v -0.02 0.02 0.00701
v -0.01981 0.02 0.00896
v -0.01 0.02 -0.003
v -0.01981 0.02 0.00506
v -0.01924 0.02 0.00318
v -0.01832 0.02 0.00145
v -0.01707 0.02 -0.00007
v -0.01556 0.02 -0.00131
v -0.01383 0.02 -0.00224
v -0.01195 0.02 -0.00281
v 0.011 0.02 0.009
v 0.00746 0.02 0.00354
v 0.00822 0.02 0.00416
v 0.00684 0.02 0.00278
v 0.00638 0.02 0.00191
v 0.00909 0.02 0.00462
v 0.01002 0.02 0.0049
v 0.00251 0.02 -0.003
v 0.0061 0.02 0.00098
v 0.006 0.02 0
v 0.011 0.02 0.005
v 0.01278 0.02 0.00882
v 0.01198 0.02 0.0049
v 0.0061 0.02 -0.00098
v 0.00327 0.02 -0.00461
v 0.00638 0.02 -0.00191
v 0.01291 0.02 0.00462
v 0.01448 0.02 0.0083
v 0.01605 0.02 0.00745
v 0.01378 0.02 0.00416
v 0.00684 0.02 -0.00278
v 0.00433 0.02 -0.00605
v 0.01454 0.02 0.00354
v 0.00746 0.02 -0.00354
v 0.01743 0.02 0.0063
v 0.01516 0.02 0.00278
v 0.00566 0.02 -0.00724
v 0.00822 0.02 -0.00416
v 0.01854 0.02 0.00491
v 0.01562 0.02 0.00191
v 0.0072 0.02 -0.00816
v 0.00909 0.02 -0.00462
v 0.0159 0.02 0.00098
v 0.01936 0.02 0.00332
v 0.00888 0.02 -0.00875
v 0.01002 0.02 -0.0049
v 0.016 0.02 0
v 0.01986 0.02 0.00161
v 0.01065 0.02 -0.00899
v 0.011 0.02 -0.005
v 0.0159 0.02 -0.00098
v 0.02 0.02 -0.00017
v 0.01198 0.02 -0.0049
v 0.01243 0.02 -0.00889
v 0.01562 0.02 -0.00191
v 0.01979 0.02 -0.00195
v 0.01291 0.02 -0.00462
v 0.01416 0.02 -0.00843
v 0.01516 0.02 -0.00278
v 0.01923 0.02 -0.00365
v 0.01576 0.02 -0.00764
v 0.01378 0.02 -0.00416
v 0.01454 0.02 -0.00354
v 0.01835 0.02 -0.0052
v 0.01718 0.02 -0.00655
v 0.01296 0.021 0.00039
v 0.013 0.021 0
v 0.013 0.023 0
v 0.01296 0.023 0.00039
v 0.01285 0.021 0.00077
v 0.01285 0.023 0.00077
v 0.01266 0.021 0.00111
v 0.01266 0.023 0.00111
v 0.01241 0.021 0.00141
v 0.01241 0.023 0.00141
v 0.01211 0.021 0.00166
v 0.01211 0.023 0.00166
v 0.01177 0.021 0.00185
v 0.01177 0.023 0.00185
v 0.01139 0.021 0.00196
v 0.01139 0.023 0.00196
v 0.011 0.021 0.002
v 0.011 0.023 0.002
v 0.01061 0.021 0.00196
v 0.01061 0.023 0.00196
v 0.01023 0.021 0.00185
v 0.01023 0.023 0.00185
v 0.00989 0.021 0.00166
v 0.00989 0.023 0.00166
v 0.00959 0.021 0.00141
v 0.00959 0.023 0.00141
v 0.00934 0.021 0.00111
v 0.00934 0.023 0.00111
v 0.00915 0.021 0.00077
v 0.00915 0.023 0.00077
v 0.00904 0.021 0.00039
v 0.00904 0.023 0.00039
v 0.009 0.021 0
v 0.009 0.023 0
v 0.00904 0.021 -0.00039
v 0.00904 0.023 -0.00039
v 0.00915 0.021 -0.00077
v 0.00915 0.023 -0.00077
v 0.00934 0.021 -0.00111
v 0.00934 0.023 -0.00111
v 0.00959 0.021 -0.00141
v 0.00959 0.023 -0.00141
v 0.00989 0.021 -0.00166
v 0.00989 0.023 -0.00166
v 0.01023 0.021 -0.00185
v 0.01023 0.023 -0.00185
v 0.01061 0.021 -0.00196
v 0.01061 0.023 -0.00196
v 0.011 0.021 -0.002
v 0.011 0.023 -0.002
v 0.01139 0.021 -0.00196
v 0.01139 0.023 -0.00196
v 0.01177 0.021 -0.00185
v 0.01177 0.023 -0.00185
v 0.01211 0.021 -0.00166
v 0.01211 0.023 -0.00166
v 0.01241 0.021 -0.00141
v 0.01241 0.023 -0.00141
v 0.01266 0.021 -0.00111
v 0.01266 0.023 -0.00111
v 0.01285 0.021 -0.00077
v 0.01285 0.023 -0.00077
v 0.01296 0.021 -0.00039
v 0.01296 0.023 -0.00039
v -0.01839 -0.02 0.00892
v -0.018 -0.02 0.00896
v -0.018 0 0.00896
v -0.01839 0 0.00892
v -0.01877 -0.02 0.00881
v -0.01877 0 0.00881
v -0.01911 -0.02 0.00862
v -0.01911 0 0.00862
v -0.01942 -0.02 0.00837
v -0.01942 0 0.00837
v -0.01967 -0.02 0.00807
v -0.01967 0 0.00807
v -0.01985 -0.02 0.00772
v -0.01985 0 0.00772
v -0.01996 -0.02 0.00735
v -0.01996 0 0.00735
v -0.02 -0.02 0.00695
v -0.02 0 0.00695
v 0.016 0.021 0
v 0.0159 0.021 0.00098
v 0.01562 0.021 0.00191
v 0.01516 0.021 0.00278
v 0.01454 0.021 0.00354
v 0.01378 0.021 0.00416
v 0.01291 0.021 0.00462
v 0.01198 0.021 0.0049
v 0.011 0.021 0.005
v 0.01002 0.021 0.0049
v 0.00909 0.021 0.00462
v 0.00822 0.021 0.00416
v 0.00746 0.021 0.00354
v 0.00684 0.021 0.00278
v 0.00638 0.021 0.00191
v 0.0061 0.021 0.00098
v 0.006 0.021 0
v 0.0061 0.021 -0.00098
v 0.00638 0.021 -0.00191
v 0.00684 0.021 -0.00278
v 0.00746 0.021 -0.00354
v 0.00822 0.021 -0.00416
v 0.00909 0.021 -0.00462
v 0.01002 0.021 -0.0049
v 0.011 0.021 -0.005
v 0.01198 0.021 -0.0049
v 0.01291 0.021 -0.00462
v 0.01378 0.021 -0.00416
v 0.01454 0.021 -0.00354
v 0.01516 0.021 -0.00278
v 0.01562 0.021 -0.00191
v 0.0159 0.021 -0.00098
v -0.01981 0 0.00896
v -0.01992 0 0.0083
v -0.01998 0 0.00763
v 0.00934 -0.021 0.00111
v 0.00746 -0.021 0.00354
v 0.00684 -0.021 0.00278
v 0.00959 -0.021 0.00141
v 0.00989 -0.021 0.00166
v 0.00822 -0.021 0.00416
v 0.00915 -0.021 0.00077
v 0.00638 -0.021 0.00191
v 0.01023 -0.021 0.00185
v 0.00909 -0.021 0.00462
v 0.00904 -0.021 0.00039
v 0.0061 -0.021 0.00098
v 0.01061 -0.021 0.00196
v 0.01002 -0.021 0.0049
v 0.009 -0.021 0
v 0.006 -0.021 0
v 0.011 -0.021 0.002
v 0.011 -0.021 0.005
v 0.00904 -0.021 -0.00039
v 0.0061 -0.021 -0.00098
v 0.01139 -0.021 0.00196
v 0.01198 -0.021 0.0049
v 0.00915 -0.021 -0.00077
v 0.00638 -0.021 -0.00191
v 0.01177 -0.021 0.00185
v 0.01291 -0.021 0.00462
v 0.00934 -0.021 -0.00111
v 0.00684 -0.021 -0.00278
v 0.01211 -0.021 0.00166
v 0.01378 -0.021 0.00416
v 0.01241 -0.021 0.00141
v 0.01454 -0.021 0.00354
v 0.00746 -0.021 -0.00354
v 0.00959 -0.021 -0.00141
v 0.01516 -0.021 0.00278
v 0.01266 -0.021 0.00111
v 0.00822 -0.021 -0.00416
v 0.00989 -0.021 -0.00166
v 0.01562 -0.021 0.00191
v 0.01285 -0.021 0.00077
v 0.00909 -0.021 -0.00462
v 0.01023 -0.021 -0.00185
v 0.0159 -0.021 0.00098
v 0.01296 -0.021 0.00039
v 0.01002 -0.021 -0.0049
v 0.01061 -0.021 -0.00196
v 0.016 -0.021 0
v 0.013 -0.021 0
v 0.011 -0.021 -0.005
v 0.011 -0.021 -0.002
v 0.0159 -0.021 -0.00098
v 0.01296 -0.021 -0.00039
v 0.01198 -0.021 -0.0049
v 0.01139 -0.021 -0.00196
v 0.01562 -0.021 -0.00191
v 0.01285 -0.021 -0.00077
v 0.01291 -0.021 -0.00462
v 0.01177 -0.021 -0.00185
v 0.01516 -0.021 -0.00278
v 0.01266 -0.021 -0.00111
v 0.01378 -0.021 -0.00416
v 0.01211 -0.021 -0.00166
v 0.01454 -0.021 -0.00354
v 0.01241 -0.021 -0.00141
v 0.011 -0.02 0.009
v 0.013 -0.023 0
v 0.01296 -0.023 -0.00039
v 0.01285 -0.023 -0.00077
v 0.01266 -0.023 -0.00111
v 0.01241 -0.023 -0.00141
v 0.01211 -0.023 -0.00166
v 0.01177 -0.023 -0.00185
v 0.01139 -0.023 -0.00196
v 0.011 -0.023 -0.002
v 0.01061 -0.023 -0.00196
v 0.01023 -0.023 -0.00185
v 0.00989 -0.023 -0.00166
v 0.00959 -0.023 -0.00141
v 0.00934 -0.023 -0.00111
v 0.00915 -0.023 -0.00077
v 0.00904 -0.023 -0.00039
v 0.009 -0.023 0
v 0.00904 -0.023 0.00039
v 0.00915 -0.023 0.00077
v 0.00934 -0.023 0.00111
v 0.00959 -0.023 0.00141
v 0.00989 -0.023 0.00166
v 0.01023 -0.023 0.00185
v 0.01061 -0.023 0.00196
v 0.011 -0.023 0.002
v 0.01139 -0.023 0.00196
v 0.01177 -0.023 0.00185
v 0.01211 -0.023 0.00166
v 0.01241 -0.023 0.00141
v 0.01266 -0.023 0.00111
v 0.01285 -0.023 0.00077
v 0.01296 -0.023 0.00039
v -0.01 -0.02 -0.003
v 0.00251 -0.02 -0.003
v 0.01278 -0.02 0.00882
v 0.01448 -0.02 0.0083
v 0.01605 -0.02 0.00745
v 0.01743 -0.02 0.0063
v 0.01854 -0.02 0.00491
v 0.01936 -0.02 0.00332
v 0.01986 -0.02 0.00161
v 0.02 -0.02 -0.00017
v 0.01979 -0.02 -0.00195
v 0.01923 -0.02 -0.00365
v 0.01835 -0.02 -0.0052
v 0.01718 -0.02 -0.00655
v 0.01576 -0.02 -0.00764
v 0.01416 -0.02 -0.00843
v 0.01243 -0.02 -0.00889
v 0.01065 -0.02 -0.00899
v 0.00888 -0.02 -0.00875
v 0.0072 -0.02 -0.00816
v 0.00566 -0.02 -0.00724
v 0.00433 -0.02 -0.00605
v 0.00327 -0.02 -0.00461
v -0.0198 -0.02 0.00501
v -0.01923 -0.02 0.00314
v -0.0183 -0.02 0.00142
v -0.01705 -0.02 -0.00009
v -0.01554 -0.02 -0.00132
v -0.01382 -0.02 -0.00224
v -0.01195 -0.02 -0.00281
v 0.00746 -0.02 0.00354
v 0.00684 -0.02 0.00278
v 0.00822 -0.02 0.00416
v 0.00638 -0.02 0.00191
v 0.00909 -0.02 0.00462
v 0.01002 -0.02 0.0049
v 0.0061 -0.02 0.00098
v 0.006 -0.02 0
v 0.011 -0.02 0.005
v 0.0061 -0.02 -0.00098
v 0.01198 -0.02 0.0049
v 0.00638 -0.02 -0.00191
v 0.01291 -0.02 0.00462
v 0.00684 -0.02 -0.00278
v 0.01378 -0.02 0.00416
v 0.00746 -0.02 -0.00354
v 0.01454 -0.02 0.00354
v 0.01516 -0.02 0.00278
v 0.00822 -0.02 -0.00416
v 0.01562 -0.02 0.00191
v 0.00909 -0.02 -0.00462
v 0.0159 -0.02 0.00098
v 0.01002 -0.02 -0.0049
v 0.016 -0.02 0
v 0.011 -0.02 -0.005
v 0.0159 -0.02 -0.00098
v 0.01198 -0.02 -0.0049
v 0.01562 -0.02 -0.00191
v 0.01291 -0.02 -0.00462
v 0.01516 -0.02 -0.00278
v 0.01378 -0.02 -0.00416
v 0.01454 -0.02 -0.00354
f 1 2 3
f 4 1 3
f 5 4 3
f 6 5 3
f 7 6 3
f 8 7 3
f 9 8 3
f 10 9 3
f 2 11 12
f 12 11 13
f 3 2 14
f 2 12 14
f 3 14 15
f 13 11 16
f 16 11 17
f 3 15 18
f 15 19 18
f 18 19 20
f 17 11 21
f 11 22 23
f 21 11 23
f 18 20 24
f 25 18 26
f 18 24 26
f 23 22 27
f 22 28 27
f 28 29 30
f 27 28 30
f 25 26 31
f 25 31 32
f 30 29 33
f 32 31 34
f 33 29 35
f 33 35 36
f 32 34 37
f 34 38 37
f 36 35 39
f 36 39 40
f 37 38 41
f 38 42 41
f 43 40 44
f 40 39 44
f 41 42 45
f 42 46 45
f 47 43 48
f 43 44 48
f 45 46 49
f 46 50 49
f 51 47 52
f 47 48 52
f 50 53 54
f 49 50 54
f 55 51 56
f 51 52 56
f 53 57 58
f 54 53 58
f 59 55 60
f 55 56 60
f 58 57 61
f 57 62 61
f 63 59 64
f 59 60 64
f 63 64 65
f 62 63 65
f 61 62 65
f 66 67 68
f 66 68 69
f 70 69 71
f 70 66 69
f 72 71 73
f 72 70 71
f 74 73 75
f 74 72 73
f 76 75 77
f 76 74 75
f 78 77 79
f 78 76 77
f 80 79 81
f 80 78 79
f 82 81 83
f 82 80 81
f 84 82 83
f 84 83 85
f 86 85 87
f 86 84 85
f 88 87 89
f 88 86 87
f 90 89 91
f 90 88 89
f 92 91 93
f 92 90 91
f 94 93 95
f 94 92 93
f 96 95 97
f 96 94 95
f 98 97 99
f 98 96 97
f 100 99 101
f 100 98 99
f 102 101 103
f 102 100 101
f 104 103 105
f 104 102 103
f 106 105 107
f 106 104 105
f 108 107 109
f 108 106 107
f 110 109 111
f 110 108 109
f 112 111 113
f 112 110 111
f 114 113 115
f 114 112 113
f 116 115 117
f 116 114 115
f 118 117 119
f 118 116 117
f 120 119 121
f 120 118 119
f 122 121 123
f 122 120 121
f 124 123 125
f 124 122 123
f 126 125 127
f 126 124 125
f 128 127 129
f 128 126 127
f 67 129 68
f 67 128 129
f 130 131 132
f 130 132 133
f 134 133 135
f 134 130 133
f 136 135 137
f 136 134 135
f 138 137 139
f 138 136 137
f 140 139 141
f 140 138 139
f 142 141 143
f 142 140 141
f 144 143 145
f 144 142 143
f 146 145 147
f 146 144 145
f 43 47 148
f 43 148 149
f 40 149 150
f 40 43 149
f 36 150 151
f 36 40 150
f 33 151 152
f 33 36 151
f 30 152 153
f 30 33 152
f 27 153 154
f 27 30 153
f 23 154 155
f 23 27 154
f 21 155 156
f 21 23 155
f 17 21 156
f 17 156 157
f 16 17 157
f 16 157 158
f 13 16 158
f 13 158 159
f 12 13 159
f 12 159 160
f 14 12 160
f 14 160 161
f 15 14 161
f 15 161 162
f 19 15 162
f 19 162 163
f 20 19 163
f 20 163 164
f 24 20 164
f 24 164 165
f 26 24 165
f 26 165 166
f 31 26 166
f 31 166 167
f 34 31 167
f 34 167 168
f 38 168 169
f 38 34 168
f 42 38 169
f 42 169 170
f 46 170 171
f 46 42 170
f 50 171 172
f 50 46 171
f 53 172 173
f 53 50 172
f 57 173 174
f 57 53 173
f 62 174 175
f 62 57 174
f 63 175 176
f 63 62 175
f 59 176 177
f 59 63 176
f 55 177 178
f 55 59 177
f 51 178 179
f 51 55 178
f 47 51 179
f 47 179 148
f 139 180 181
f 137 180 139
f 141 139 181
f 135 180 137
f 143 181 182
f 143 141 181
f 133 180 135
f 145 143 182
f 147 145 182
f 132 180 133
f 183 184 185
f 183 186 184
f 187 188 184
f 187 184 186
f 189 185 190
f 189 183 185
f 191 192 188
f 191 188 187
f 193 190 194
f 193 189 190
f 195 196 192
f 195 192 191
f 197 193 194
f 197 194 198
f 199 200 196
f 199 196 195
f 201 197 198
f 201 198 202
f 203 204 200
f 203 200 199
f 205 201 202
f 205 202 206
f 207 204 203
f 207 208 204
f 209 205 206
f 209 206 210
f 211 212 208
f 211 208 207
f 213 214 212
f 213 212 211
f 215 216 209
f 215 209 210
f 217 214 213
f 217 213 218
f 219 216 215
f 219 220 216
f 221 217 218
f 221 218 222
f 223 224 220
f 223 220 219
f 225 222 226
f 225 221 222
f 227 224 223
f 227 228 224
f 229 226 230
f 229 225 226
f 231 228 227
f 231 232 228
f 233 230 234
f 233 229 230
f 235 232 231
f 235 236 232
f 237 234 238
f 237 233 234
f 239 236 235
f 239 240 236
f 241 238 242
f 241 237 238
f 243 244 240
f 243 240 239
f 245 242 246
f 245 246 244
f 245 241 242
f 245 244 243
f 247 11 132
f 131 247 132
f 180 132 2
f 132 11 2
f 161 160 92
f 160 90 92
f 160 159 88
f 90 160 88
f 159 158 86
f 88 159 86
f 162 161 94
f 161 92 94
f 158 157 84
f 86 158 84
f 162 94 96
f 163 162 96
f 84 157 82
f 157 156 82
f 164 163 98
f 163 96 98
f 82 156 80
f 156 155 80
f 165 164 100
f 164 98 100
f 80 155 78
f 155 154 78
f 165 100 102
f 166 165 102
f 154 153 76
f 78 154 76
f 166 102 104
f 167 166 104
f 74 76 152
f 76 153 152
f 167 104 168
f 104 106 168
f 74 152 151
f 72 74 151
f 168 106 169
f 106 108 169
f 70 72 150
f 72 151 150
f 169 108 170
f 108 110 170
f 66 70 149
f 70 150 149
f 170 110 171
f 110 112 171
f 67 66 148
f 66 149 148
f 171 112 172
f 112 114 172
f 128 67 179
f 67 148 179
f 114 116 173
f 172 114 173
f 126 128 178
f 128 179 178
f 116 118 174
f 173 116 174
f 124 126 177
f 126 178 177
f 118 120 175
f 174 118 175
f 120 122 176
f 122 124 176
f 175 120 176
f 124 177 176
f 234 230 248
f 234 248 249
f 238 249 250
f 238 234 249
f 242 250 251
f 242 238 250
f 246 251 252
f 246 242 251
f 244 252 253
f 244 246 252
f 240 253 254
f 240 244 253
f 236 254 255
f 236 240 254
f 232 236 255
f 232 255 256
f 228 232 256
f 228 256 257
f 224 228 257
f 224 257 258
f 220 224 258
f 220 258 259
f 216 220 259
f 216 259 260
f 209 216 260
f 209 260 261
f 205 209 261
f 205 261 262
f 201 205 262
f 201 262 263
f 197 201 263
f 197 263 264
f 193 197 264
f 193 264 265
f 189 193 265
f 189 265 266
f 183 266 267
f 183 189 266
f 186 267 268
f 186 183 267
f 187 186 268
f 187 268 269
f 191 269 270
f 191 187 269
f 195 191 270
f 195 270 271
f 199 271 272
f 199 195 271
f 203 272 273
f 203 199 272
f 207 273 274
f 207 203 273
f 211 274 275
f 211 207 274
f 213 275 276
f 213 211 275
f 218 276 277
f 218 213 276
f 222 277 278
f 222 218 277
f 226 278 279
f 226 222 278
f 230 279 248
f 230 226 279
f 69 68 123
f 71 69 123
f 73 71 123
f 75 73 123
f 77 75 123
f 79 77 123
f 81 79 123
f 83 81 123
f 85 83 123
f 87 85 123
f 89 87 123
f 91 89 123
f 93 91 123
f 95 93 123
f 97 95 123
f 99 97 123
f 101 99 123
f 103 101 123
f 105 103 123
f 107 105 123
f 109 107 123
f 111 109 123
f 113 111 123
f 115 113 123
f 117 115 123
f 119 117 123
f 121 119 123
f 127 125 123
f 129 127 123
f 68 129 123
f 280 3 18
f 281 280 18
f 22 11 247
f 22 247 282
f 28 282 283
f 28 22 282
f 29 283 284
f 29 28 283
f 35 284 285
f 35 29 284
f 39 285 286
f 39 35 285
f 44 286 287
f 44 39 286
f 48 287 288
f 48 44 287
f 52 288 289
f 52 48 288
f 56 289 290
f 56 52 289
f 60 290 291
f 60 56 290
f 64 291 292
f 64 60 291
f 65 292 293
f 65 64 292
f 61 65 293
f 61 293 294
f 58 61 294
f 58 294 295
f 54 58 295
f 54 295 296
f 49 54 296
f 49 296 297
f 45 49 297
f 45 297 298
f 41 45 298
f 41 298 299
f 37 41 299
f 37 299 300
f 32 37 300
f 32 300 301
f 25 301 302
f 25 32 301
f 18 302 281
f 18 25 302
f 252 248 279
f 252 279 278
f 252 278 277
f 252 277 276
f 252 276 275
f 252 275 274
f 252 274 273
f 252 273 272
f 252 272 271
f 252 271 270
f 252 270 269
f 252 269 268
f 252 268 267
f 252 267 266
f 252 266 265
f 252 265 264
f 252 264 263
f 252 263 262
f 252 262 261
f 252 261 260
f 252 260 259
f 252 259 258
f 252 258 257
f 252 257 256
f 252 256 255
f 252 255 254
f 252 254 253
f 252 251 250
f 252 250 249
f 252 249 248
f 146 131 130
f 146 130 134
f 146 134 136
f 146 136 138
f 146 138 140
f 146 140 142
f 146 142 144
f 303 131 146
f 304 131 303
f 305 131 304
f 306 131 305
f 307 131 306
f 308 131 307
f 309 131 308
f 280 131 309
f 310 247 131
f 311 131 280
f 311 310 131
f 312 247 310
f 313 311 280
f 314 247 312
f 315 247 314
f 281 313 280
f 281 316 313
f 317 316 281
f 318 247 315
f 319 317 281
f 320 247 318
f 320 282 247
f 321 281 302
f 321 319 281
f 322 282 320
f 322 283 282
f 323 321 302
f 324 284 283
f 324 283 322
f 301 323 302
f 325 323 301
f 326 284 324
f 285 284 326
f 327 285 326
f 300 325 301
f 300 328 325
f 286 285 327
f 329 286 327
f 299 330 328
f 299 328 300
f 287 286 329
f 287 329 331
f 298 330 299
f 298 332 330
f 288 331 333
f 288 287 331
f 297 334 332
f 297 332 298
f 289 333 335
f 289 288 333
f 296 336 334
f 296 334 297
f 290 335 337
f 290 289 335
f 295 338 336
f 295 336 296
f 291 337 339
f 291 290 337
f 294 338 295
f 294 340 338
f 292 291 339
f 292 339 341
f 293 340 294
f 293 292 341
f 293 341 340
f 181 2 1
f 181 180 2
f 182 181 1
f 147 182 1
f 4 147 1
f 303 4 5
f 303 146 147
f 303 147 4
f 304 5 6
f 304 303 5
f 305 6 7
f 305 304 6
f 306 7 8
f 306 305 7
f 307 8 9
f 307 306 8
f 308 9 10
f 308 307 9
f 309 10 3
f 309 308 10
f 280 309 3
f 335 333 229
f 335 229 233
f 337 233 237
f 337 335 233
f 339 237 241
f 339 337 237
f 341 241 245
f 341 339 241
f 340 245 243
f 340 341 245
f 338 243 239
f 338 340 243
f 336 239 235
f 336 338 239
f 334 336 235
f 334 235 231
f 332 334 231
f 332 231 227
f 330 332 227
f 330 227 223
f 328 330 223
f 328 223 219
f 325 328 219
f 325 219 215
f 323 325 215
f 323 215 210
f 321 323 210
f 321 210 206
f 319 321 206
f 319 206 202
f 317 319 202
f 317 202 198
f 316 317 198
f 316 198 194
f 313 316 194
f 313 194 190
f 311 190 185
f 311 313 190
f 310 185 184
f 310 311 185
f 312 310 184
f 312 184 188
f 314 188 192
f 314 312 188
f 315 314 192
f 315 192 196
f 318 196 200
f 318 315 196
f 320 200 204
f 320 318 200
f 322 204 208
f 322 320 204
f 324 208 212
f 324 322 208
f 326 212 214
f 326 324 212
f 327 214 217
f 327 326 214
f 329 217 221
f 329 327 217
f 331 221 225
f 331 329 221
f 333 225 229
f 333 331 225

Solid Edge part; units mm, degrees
sketch "Sketch1" plane through (0, 0, 0) normal (0, -1, 0) x (1, 0, 0)
  line L0 (0.011, 0.009) -> (-0.02, 0.009)
  line L1 (-0.02, 0.009) -> (-0.02, 0.007) construction
  line L2 (-0.01, -0.003) -> (0.0025, -0.003)
  arc A0 (0.0025, -0.003) -> (0.011, 0.009) centre (0.011, 0) ccw
  arc A1 (-0.02, 0.007) -> (-0.01, -0.003) centre (-0.01, 0.007) ccw
  dimension "D1" = 0.011
  dimension "D2" = 0.02
extrude "Protrusion1" add sketch "Sketch1" along normal mid plane 0.04
fillet "Verrundung_1" radius 0.002 1 edges at (-0.02, 0, 0.009)
sketch "Sketch2" plane through (0, 0, 0) normal (0, -1, 0) x (1, 0, 0)
  circle A0 centre (0.011, 0) radius 0.005
  dimension "D1" = 0.01
extrude "Ausprägung_2" add sketch "Sketch2" along normal mid plane 0.042
sketch "Sketch3" plane through (0, 0, 0) normal (0, -1, 0) x (1, 0, 0)
  circle A0 centre (0.011, 0) radius 0.002
  dimension "D1" = 0.004
extrude "Ausprägung_3" add sketch "Sketch3" along normal mid plane 0.046
